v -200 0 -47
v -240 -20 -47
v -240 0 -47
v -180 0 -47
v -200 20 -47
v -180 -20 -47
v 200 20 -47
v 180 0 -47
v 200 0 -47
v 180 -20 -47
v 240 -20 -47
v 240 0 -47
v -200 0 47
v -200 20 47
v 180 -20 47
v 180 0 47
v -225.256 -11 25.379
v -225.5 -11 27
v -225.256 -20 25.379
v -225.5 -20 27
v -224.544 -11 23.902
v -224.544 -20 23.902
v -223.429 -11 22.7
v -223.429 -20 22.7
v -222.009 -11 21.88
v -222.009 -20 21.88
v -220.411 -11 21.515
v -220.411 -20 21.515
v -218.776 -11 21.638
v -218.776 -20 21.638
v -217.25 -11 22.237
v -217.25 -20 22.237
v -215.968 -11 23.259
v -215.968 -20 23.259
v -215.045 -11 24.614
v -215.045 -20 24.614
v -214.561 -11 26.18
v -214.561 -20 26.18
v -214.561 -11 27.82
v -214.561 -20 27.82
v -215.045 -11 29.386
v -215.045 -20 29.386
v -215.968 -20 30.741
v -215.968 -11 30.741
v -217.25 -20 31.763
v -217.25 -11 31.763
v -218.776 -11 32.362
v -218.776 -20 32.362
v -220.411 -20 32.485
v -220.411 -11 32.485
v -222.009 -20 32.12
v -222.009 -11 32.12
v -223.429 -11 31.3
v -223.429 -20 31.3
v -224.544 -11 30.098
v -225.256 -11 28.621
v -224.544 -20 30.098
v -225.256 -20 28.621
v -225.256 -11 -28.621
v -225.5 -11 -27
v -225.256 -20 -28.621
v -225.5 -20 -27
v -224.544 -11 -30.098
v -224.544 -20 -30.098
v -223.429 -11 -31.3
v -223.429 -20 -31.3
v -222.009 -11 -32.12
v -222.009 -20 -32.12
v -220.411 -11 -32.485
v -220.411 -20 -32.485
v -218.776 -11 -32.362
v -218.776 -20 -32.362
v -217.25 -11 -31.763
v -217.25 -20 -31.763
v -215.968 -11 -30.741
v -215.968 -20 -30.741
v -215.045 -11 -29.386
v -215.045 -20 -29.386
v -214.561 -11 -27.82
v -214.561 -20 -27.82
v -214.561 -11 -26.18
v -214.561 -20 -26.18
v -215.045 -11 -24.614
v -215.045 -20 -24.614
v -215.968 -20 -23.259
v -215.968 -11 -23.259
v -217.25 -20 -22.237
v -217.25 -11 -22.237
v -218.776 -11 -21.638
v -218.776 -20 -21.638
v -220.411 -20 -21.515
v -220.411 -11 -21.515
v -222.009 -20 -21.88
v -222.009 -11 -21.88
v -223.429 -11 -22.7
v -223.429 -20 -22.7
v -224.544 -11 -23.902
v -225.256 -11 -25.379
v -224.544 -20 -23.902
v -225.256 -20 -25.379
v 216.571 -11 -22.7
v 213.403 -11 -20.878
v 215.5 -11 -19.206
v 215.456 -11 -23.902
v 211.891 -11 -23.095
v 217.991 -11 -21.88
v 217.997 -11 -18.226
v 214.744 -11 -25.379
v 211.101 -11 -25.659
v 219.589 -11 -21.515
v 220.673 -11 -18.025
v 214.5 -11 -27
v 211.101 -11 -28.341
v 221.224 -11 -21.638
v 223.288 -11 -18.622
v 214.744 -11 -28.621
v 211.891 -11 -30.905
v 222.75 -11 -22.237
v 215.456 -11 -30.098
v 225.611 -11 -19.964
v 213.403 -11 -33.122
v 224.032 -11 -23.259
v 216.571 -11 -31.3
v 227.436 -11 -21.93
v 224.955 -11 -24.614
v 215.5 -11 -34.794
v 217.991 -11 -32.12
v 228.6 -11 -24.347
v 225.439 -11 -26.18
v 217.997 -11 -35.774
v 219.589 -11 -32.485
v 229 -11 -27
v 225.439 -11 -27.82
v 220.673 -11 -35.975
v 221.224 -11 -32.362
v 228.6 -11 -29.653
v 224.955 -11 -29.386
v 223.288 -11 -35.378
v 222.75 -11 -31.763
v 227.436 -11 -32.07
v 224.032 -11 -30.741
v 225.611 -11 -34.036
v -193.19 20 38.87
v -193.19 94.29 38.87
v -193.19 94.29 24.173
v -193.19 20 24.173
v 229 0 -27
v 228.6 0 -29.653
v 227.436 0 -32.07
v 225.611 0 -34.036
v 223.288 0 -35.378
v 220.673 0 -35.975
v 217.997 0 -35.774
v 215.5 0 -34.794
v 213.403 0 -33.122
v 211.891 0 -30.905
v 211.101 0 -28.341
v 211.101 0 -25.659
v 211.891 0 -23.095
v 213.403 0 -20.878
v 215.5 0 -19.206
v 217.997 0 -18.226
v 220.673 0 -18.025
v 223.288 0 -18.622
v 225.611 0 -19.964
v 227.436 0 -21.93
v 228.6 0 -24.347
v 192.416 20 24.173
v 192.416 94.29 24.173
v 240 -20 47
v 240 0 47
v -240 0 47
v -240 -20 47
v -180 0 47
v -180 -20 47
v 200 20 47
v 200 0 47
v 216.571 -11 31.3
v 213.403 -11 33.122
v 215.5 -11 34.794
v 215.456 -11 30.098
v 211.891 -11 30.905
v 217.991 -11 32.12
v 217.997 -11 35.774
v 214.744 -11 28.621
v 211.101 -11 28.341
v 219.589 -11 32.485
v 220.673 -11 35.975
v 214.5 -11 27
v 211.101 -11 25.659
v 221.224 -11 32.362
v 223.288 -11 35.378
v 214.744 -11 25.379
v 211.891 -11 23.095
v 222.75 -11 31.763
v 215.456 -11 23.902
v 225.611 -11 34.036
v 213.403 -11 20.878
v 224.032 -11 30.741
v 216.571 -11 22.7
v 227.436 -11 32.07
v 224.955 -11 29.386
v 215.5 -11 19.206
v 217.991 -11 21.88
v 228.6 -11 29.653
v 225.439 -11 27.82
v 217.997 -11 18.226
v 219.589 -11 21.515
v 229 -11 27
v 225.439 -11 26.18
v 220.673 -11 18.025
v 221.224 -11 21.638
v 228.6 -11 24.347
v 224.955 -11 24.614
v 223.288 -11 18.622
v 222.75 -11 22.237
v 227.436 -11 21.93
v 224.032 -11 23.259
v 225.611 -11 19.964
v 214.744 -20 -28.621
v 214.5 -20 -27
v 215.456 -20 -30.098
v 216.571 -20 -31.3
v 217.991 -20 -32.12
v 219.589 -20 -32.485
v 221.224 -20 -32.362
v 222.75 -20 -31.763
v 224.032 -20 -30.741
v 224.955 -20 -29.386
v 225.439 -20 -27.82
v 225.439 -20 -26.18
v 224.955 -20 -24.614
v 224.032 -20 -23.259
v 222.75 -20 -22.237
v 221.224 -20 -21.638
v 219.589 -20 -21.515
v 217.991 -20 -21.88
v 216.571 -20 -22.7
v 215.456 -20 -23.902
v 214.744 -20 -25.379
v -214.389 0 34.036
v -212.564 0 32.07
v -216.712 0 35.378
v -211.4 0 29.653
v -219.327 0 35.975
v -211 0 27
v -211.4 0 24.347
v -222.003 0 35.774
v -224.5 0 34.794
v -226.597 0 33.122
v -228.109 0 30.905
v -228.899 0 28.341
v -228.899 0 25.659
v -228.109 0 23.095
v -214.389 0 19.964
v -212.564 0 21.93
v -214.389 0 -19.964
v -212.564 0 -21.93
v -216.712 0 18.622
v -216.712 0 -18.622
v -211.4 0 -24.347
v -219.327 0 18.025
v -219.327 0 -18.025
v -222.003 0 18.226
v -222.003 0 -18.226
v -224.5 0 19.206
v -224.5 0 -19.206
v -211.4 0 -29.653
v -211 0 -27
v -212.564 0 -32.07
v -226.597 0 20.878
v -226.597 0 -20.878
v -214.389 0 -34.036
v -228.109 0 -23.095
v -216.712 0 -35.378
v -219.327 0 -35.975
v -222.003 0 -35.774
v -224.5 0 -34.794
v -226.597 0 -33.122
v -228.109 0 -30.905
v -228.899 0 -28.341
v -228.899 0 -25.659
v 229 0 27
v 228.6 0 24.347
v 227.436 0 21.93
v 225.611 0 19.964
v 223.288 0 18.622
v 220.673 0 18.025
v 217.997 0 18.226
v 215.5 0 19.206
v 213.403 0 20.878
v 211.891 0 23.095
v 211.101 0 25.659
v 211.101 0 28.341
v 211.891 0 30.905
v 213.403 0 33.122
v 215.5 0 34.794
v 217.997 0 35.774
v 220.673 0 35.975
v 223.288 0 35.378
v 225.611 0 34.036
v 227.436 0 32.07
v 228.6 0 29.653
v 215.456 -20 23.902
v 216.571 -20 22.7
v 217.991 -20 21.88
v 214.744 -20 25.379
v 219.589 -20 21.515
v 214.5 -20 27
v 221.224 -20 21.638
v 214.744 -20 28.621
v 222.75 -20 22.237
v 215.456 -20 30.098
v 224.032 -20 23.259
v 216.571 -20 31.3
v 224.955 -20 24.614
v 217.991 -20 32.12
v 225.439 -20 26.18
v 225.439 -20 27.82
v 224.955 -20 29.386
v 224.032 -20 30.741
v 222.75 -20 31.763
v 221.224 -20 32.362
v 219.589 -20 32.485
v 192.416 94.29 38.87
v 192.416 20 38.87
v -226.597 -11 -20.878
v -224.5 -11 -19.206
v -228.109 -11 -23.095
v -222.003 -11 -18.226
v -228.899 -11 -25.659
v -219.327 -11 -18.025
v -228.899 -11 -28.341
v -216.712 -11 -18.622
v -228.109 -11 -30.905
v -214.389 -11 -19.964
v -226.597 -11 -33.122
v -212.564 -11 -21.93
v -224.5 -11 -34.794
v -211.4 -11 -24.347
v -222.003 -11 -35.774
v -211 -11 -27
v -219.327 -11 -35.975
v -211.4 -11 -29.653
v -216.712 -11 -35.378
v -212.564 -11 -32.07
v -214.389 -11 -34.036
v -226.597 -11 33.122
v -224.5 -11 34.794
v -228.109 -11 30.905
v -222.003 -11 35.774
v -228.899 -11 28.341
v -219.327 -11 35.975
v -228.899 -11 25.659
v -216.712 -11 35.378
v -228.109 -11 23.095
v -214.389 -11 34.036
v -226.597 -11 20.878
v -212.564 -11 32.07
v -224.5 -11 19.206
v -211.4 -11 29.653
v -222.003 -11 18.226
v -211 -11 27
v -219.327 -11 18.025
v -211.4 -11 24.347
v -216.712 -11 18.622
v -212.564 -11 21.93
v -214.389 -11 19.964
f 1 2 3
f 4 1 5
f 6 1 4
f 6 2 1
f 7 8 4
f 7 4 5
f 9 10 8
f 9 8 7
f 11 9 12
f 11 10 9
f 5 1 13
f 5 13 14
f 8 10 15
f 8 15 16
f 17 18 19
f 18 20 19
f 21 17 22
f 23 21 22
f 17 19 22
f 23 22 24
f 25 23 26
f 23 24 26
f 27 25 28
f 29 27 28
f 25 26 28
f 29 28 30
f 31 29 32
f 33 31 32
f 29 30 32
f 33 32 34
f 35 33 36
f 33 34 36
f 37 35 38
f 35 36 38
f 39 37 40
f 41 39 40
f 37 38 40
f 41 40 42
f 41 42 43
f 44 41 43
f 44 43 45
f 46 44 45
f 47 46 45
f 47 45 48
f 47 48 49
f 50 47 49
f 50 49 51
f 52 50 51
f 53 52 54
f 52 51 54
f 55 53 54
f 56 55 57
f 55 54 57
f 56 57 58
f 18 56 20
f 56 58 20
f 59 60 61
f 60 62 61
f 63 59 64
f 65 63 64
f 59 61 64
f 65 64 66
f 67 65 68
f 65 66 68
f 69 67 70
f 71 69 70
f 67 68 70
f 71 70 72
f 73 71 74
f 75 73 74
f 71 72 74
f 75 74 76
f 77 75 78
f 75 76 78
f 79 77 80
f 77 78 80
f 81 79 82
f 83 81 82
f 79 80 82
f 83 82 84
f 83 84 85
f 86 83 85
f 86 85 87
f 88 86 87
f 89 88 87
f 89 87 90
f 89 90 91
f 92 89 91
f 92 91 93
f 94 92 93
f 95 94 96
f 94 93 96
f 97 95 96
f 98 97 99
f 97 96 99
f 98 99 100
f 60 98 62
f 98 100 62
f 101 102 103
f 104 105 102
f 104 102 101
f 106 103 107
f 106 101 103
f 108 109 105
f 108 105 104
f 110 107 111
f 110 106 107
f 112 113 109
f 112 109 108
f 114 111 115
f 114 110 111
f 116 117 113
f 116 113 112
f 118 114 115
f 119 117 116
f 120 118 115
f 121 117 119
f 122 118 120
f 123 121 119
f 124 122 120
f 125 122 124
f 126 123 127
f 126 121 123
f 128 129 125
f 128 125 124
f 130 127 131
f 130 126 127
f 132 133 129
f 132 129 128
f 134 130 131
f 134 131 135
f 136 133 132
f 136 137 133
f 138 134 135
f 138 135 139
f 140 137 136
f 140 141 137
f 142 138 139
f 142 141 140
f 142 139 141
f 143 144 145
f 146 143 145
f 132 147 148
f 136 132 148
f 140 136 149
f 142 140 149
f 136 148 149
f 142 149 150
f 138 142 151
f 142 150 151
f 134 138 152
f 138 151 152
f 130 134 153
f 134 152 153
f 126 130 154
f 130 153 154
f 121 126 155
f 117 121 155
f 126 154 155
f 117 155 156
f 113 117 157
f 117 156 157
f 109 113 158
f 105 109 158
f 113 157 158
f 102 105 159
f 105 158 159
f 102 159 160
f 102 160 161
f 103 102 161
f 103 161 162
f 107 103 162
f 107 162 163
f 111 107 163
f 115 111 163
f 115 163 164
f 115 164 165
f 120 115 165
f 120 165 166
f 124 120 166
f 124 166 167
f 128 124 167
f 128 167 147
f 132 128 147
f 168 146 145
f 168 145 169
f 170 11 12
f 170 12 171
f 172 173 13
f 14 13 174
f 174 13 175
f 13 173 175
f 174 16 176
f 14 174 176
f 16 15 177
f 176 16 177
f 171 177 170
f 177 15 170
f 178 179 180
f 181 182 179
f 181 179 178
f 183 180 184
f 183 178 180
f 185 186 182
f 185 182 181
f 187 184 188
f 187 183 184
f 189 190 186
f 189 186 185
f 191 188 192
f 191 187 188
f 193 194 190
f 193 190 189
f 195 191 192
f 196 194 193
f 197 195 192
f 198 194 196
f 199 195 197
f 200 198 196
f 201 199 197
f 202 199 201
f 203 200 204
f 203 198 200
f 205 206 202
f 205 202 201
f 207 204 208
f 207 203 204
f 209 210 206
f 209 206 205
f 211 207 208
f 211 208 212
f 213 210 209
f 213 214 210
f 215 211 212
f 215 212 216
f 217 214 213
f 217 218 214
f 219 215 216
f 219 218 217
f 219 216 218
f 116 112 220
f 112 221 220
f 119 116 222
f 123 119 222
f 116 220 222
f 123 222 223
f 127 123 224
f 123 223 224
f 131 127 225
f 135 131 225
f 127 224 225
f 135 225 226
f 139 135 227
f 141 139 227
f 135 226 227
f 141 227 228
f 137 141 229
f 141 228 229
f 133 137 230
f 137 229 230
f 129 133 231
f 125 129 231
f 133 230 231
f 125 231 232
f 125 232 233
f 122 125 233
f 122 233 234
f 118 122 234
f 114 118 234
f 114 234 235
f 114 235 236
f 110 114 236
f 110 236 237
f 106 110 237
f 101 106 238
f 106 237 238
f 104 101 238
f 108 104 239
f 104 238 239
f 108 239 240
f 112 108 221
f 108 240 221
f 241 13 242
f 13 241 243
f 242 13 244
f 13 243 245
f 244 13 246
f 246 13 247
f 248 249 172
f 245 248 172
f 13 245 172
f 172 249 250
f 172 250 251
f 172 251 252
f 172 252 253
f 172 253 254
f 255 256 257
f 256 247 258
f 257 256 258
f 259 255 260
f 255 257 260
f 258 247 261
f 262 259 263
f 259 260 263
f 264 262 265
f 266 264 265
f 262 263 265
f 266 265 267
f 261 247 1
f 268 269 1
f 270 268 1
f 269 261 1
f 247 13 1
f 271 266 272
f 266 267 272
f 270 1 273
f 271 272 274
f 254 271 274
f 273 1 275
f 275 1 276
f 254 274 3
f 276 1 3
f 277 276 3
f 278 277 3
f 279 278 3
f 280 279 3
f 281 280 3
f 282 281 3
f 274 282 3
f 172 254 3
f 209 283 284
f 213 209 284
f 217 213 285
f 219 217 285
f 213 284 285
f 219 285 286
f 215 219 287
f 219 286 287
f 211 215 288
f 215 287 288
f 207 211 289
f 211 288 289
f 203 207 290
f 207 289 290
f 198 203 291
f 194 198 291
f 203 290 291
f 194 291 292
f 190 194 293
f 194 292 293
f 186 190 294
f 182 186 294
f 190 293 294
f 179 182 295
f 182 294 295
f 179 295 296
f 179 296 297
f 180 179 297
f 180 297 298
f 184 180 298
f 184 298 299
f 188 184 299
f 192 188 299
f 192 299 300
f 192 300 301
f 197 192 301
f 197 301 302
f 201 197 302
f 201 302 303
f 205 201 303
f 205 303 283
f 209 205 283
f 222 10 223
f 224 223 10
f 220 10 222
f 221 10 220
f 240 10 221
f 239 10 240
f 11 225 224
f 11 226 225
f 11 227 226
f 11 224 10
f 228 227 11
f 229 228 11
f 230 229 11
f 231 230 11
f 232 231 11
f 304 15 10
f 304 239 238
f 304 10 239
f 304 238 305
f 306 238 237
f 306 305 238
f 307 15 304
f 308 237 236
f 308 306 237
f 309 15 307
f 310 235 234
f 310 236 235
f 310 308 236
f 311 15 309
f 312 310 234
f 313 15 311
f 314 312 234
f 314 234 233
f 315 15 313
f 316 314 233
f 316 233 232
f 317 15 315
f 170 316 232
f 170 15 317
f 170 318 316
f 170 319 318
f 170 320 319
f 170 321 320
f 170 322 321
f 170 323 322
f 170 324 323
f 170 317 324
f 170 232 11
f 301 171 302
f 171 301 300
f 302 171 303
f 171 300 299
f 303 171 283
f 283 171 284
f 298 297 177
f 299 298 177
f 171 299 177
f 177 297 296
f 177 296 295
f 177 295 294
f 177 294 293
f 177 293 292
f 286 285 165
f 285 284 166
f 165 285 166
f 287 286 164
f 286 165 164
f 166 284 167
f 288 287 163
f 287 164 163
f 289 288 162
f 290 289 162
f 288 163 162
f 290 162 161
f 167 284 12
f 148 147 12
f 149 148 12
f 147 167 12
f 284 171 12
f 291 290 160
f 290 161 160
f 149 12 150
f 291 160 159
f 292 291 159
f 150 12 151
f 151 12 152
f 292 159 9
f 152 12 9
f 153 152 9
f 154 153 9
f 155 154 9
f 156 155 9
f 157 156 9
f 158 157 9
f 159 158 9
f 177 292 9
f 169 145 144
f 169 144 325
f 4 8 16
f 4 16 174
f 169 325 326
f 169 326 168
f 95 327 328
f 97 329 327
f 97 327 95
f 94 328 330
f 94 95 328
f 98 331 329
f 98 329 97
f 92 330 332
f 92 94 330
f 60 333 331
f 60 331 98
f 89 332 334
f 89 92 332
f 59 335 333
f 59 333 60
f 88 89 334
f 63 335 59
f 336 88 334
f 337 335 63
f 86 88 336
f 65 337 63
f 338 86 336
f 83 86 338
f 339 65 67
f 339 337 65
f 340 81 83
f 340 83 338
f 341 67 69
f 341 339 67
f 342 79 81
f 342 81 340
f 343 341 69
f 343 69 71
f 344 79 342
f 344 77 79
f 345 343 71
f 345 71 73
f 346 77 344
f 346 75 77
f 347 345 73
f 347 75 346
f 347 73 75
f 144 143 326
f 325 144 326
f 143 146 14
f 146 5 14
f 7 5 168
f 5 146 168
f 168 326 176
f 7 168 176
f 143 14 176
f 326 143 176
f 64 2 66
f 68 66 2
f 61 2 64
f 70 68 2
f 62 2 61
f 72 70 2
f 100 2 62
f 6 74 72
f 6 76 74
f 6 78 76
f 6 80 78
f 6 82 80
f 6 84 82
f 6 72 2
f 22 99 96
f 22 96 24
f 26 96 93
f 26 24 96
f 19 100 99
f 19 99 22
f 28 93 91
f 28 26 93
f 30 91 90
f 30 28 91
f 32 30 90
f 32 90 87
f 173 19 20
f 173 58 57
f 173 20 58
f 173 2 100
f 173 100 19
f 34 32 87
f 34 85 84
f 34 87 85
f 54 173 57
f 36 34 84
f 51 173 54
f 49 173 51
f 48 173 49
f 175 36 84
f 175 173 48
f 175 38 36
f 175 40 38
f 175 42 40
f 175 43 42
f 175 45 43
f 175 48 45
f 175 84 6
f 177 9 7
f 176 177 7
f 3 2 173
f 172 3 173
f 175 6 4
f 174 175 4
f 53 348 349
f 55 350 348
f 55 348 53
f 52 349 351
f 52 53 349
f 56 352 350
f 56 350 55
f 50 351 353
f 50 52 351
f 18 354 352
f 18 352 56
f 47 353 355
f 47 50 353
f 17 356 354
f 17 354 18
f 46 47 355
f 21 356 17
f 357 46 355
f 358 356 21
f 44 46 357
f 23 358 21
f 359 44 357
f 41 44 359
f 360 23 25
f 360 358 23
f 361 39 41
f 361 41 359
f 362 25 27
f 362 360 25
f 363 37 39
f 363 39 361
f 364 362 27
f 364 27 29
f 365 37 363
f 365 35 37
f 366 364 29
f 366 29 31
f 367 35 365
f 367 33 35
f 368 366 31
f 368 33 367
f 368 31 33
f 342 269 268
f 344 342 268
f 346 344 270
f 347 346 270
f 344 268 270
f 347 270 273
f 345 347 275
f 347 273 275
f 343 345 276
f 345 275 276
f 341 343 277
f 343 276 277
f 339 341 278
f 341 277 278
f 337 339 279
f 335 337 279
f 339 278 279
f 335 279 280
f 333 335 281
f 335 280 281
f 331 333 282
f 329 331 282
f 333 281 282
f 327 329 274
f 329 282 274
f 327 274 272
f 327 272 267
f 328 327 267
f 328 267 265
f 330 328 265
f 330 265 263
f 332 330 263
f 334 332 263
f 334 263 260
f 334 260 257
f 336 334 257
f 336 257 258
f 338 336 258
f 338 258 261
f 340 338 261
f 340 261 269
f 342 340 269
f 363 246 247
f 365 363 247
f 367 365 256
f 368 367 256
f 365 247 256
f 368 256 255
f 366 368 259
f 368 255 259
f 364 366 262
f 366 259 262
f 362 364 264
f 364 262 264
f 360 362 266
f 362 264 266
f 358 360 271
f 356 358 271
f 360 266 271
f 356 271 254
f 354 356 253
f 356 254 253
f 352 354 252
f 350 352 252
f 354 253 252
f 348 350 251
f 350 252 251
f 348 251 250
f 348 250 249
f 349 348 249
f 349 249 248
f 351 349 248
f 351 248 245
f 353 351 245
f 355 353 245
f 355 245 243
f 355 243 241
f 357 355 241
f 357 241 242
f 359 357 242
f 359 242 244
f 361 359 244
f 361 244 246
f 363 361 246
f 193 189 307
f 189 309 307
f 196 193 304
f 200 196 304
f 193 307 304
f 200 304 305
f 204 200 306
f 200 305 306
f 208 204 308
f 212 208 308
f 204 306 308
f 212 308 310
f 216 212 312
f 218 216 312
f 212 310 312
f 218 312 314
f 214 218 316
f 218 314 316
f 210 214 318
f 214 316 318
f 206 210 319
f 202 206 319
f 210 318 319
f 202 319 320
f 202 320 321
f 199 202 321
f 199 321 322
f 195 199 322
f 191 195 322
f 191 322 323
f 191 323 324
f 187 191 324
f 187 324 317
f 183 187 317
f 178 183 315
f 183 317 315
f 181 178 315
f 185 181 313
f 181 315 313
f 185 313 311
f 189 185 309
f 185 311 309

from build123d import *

# Parameters (mm, degrees)
SKETCH_1_W                    = 480
SKETCH_1_H                    = 94
EXTRUDE_1_DEPTH               = 40
SKETCH_2_W                    = 40
SKETCH_2_H                    = 20
CUT_EXTRUDE_1_DEPTH           = 259.526594377
SKETCH_3_W                    = 360
SKETCH_3_H                    = 20
CUT_EXTRUDE_2_DEPTH           = 259.526594377
SKETCH_4_W                    = 40
SKETCH_4_H                    = 20
CUT_EXTRUDE_3_DEPTH           = 259.526594377
HOLE_WIZARD_M10_1_D           = 11
HOLE_WIZARD_M10_1_CBORE_D     = 18
HOLE_WIZARD_M10_1_CBORE_DEPTH = 11
SKETCH_9_W                    = 385.606218599
SKETCH_9_H                    = 14.697127689
EXTRUDE_2_DEPTH               = 74.29


with BuildPart() as part:
    # 草图1 → 凸台-拉伸1 (new body)
    with BuildSketch(Plane.XZ.offset(20)):
        Rectangle(SKETCH_1_W, SKETCH_1_H)
    extrude(amount=-EXTRUDE_1_DEPTH)

    # 草图2 → 切除-拉伸1 (cut, through all)
    with BuildSketch(Plane(origin=(0, 0, -47), x_dir=(-1, 0, 0), z_dir=(0, 0, -1))):
        with Locations((220, 10)):
            Rectangle(SKETCH_2_W, SKETCH_2_H)
    extrude(amount=-CUT_EXTRUDE_1_DEPTH, mode=Mode.SUBTRACT)

    # 草图3 → 切除-拉伸2 (cut, through all)
    with BuildSketch(Plane(origin=(0, 0, -47), x_dir=(-1, 0, 0), z_dir=(0, 0, -1))):
        with Locations((0, -10)):
            Rectangle(SKETCH_3_W, SKETCH_3_H)
    extrude(amount=-CUT_EXTRUDE_2_DEPTH, mode=Mode.SUBTRACT)

    # 草图4 → 切除-拉伸3 (cut, through all)
    with BuildSketch(Plane(origin=(0, 0, -47), x_dir=(-1, 0, 0), z_dir=(0, 0, -1))):
        with Locations((-220, 10)):
            Rectangle(SKETCH_4_W, SKETCH_4_H)
    extrude(amount=-CUT_EXTRUDE_3_DEPTH, mode=Mode.SUBTRACT)

    # M10 六角头螺栓的柱形沉头孔1 (through all)
    with Locations(Plane(origin=(0, 0, 0), x_dir=(1, 0, 0), z_dir=(0, 1, 0))):
        with Locations((220, -27), (220, 27), (-220, -27), (-220, 27)):
            CounterBoreHole(HOLE_WIZARD_M10_1_D / 2, HOLE_WIZARD_M10_1_CBORE_D / 2, HOLE_WIZARD_M10_1_CBORE_DEPTH)

    # 草图9 → 凸台-拉伸2 (add)
    with BuildSketch(Plane(origin=(0, 20, 0), x_dir=(1, 0, 0), z_dir=(0, 1, 0))):
        with Locations((-0.386766518, -31.52147123)):
            Rectangle(SKETCH_9_W, SKETCH_9_H)
    extrude(amount=EXTRUDE_2_DEPTH)


solid = part.part
